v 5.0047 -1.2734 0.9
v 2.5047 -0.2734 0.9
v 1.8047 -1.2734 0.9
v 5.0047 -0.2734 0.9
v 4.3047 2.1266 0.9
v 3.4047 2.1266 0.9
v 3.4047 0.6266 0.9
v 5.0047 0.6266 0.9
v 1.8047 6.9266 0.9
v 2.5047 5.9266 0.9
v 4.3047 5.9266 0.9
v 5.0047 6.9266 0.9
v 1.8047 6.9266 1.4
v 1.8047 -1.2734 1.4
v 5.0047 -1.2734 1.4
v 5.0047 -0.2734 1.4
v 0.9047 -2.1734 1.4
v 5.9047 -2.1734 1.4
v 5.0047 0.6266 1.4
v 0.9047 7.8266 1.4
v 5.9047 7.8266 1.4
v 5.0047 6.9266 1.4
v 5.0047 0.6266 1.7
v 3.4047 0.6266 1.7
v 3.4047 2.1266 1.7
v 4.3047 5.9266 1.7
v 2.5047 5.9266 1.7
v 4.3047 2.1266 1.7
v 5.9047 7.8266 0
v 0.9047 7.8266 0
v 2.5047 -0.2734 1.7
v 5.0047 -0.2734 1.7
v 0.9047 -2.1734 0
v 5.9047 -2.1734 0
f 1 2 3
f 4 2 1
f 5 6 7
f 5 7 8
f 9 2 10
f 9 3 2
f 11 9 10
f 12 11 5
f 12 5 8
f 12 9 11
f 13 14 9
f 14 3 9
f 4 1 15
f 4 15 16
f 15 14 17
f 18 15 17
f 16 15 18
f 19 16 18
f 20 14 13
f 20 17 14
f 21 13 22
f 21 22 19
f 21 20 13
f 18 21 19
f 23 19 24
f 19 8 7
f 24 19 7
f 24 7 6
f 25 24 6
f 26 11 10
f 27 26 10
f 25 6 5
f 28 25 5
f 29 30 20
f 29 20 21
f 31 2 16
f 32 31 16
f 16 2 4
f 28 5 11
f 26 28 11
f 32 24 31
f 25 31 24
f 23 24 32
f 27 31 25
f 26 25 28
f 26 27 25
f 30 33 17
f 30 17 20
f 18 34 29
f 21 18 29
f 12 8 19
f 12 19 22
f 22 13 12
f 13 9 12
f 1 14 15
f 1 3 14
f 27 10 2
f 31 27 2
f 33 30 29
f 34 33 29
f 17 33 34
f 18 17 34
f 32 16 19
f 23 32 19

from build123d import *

# Parameters (mm, degrees)
F0_W     = 5
F0_H     = 10
F1_DEPTH = 1.4
F2_T     = -0.9
F4_DEPTH = 0.8


with BuildPart() as f1:
    # F0 (on Top) → F1 (new body)
    with BuildSketch(Plane.XY):
        with Locations((3.4046815708, 2.8265781289)):
            Rectangle(F0_W, F0_H)
    extrude(amount=F1_DEPTH)

    # F2
    f2_openings = [f1.faces().sort_by_distance(p)[0] for p in [
        (3.404682, 2.826578, 1.4),
    ]]
    offset(amount=F2_T, openings=f2_openings)

    # F3 (on face) → F4 (join)
    with BuildSketch(Plane.XY.offset(0.9)):
        Polygon((5.0046815708, -0.2734218711), (5.0046815708, 0.6265781289), (3.4046815708, 0.6265781289), (3.4046815708, 2.1265781289), (4.3046815708, 2.1265781289), (4.3046815708, 5.9265781289), (2.5046815708, 5.9265781289), (2.5046815708, -0.2734218711), align=None)
    extrude(amount=F4_DEPTH)


solid = f1.part
